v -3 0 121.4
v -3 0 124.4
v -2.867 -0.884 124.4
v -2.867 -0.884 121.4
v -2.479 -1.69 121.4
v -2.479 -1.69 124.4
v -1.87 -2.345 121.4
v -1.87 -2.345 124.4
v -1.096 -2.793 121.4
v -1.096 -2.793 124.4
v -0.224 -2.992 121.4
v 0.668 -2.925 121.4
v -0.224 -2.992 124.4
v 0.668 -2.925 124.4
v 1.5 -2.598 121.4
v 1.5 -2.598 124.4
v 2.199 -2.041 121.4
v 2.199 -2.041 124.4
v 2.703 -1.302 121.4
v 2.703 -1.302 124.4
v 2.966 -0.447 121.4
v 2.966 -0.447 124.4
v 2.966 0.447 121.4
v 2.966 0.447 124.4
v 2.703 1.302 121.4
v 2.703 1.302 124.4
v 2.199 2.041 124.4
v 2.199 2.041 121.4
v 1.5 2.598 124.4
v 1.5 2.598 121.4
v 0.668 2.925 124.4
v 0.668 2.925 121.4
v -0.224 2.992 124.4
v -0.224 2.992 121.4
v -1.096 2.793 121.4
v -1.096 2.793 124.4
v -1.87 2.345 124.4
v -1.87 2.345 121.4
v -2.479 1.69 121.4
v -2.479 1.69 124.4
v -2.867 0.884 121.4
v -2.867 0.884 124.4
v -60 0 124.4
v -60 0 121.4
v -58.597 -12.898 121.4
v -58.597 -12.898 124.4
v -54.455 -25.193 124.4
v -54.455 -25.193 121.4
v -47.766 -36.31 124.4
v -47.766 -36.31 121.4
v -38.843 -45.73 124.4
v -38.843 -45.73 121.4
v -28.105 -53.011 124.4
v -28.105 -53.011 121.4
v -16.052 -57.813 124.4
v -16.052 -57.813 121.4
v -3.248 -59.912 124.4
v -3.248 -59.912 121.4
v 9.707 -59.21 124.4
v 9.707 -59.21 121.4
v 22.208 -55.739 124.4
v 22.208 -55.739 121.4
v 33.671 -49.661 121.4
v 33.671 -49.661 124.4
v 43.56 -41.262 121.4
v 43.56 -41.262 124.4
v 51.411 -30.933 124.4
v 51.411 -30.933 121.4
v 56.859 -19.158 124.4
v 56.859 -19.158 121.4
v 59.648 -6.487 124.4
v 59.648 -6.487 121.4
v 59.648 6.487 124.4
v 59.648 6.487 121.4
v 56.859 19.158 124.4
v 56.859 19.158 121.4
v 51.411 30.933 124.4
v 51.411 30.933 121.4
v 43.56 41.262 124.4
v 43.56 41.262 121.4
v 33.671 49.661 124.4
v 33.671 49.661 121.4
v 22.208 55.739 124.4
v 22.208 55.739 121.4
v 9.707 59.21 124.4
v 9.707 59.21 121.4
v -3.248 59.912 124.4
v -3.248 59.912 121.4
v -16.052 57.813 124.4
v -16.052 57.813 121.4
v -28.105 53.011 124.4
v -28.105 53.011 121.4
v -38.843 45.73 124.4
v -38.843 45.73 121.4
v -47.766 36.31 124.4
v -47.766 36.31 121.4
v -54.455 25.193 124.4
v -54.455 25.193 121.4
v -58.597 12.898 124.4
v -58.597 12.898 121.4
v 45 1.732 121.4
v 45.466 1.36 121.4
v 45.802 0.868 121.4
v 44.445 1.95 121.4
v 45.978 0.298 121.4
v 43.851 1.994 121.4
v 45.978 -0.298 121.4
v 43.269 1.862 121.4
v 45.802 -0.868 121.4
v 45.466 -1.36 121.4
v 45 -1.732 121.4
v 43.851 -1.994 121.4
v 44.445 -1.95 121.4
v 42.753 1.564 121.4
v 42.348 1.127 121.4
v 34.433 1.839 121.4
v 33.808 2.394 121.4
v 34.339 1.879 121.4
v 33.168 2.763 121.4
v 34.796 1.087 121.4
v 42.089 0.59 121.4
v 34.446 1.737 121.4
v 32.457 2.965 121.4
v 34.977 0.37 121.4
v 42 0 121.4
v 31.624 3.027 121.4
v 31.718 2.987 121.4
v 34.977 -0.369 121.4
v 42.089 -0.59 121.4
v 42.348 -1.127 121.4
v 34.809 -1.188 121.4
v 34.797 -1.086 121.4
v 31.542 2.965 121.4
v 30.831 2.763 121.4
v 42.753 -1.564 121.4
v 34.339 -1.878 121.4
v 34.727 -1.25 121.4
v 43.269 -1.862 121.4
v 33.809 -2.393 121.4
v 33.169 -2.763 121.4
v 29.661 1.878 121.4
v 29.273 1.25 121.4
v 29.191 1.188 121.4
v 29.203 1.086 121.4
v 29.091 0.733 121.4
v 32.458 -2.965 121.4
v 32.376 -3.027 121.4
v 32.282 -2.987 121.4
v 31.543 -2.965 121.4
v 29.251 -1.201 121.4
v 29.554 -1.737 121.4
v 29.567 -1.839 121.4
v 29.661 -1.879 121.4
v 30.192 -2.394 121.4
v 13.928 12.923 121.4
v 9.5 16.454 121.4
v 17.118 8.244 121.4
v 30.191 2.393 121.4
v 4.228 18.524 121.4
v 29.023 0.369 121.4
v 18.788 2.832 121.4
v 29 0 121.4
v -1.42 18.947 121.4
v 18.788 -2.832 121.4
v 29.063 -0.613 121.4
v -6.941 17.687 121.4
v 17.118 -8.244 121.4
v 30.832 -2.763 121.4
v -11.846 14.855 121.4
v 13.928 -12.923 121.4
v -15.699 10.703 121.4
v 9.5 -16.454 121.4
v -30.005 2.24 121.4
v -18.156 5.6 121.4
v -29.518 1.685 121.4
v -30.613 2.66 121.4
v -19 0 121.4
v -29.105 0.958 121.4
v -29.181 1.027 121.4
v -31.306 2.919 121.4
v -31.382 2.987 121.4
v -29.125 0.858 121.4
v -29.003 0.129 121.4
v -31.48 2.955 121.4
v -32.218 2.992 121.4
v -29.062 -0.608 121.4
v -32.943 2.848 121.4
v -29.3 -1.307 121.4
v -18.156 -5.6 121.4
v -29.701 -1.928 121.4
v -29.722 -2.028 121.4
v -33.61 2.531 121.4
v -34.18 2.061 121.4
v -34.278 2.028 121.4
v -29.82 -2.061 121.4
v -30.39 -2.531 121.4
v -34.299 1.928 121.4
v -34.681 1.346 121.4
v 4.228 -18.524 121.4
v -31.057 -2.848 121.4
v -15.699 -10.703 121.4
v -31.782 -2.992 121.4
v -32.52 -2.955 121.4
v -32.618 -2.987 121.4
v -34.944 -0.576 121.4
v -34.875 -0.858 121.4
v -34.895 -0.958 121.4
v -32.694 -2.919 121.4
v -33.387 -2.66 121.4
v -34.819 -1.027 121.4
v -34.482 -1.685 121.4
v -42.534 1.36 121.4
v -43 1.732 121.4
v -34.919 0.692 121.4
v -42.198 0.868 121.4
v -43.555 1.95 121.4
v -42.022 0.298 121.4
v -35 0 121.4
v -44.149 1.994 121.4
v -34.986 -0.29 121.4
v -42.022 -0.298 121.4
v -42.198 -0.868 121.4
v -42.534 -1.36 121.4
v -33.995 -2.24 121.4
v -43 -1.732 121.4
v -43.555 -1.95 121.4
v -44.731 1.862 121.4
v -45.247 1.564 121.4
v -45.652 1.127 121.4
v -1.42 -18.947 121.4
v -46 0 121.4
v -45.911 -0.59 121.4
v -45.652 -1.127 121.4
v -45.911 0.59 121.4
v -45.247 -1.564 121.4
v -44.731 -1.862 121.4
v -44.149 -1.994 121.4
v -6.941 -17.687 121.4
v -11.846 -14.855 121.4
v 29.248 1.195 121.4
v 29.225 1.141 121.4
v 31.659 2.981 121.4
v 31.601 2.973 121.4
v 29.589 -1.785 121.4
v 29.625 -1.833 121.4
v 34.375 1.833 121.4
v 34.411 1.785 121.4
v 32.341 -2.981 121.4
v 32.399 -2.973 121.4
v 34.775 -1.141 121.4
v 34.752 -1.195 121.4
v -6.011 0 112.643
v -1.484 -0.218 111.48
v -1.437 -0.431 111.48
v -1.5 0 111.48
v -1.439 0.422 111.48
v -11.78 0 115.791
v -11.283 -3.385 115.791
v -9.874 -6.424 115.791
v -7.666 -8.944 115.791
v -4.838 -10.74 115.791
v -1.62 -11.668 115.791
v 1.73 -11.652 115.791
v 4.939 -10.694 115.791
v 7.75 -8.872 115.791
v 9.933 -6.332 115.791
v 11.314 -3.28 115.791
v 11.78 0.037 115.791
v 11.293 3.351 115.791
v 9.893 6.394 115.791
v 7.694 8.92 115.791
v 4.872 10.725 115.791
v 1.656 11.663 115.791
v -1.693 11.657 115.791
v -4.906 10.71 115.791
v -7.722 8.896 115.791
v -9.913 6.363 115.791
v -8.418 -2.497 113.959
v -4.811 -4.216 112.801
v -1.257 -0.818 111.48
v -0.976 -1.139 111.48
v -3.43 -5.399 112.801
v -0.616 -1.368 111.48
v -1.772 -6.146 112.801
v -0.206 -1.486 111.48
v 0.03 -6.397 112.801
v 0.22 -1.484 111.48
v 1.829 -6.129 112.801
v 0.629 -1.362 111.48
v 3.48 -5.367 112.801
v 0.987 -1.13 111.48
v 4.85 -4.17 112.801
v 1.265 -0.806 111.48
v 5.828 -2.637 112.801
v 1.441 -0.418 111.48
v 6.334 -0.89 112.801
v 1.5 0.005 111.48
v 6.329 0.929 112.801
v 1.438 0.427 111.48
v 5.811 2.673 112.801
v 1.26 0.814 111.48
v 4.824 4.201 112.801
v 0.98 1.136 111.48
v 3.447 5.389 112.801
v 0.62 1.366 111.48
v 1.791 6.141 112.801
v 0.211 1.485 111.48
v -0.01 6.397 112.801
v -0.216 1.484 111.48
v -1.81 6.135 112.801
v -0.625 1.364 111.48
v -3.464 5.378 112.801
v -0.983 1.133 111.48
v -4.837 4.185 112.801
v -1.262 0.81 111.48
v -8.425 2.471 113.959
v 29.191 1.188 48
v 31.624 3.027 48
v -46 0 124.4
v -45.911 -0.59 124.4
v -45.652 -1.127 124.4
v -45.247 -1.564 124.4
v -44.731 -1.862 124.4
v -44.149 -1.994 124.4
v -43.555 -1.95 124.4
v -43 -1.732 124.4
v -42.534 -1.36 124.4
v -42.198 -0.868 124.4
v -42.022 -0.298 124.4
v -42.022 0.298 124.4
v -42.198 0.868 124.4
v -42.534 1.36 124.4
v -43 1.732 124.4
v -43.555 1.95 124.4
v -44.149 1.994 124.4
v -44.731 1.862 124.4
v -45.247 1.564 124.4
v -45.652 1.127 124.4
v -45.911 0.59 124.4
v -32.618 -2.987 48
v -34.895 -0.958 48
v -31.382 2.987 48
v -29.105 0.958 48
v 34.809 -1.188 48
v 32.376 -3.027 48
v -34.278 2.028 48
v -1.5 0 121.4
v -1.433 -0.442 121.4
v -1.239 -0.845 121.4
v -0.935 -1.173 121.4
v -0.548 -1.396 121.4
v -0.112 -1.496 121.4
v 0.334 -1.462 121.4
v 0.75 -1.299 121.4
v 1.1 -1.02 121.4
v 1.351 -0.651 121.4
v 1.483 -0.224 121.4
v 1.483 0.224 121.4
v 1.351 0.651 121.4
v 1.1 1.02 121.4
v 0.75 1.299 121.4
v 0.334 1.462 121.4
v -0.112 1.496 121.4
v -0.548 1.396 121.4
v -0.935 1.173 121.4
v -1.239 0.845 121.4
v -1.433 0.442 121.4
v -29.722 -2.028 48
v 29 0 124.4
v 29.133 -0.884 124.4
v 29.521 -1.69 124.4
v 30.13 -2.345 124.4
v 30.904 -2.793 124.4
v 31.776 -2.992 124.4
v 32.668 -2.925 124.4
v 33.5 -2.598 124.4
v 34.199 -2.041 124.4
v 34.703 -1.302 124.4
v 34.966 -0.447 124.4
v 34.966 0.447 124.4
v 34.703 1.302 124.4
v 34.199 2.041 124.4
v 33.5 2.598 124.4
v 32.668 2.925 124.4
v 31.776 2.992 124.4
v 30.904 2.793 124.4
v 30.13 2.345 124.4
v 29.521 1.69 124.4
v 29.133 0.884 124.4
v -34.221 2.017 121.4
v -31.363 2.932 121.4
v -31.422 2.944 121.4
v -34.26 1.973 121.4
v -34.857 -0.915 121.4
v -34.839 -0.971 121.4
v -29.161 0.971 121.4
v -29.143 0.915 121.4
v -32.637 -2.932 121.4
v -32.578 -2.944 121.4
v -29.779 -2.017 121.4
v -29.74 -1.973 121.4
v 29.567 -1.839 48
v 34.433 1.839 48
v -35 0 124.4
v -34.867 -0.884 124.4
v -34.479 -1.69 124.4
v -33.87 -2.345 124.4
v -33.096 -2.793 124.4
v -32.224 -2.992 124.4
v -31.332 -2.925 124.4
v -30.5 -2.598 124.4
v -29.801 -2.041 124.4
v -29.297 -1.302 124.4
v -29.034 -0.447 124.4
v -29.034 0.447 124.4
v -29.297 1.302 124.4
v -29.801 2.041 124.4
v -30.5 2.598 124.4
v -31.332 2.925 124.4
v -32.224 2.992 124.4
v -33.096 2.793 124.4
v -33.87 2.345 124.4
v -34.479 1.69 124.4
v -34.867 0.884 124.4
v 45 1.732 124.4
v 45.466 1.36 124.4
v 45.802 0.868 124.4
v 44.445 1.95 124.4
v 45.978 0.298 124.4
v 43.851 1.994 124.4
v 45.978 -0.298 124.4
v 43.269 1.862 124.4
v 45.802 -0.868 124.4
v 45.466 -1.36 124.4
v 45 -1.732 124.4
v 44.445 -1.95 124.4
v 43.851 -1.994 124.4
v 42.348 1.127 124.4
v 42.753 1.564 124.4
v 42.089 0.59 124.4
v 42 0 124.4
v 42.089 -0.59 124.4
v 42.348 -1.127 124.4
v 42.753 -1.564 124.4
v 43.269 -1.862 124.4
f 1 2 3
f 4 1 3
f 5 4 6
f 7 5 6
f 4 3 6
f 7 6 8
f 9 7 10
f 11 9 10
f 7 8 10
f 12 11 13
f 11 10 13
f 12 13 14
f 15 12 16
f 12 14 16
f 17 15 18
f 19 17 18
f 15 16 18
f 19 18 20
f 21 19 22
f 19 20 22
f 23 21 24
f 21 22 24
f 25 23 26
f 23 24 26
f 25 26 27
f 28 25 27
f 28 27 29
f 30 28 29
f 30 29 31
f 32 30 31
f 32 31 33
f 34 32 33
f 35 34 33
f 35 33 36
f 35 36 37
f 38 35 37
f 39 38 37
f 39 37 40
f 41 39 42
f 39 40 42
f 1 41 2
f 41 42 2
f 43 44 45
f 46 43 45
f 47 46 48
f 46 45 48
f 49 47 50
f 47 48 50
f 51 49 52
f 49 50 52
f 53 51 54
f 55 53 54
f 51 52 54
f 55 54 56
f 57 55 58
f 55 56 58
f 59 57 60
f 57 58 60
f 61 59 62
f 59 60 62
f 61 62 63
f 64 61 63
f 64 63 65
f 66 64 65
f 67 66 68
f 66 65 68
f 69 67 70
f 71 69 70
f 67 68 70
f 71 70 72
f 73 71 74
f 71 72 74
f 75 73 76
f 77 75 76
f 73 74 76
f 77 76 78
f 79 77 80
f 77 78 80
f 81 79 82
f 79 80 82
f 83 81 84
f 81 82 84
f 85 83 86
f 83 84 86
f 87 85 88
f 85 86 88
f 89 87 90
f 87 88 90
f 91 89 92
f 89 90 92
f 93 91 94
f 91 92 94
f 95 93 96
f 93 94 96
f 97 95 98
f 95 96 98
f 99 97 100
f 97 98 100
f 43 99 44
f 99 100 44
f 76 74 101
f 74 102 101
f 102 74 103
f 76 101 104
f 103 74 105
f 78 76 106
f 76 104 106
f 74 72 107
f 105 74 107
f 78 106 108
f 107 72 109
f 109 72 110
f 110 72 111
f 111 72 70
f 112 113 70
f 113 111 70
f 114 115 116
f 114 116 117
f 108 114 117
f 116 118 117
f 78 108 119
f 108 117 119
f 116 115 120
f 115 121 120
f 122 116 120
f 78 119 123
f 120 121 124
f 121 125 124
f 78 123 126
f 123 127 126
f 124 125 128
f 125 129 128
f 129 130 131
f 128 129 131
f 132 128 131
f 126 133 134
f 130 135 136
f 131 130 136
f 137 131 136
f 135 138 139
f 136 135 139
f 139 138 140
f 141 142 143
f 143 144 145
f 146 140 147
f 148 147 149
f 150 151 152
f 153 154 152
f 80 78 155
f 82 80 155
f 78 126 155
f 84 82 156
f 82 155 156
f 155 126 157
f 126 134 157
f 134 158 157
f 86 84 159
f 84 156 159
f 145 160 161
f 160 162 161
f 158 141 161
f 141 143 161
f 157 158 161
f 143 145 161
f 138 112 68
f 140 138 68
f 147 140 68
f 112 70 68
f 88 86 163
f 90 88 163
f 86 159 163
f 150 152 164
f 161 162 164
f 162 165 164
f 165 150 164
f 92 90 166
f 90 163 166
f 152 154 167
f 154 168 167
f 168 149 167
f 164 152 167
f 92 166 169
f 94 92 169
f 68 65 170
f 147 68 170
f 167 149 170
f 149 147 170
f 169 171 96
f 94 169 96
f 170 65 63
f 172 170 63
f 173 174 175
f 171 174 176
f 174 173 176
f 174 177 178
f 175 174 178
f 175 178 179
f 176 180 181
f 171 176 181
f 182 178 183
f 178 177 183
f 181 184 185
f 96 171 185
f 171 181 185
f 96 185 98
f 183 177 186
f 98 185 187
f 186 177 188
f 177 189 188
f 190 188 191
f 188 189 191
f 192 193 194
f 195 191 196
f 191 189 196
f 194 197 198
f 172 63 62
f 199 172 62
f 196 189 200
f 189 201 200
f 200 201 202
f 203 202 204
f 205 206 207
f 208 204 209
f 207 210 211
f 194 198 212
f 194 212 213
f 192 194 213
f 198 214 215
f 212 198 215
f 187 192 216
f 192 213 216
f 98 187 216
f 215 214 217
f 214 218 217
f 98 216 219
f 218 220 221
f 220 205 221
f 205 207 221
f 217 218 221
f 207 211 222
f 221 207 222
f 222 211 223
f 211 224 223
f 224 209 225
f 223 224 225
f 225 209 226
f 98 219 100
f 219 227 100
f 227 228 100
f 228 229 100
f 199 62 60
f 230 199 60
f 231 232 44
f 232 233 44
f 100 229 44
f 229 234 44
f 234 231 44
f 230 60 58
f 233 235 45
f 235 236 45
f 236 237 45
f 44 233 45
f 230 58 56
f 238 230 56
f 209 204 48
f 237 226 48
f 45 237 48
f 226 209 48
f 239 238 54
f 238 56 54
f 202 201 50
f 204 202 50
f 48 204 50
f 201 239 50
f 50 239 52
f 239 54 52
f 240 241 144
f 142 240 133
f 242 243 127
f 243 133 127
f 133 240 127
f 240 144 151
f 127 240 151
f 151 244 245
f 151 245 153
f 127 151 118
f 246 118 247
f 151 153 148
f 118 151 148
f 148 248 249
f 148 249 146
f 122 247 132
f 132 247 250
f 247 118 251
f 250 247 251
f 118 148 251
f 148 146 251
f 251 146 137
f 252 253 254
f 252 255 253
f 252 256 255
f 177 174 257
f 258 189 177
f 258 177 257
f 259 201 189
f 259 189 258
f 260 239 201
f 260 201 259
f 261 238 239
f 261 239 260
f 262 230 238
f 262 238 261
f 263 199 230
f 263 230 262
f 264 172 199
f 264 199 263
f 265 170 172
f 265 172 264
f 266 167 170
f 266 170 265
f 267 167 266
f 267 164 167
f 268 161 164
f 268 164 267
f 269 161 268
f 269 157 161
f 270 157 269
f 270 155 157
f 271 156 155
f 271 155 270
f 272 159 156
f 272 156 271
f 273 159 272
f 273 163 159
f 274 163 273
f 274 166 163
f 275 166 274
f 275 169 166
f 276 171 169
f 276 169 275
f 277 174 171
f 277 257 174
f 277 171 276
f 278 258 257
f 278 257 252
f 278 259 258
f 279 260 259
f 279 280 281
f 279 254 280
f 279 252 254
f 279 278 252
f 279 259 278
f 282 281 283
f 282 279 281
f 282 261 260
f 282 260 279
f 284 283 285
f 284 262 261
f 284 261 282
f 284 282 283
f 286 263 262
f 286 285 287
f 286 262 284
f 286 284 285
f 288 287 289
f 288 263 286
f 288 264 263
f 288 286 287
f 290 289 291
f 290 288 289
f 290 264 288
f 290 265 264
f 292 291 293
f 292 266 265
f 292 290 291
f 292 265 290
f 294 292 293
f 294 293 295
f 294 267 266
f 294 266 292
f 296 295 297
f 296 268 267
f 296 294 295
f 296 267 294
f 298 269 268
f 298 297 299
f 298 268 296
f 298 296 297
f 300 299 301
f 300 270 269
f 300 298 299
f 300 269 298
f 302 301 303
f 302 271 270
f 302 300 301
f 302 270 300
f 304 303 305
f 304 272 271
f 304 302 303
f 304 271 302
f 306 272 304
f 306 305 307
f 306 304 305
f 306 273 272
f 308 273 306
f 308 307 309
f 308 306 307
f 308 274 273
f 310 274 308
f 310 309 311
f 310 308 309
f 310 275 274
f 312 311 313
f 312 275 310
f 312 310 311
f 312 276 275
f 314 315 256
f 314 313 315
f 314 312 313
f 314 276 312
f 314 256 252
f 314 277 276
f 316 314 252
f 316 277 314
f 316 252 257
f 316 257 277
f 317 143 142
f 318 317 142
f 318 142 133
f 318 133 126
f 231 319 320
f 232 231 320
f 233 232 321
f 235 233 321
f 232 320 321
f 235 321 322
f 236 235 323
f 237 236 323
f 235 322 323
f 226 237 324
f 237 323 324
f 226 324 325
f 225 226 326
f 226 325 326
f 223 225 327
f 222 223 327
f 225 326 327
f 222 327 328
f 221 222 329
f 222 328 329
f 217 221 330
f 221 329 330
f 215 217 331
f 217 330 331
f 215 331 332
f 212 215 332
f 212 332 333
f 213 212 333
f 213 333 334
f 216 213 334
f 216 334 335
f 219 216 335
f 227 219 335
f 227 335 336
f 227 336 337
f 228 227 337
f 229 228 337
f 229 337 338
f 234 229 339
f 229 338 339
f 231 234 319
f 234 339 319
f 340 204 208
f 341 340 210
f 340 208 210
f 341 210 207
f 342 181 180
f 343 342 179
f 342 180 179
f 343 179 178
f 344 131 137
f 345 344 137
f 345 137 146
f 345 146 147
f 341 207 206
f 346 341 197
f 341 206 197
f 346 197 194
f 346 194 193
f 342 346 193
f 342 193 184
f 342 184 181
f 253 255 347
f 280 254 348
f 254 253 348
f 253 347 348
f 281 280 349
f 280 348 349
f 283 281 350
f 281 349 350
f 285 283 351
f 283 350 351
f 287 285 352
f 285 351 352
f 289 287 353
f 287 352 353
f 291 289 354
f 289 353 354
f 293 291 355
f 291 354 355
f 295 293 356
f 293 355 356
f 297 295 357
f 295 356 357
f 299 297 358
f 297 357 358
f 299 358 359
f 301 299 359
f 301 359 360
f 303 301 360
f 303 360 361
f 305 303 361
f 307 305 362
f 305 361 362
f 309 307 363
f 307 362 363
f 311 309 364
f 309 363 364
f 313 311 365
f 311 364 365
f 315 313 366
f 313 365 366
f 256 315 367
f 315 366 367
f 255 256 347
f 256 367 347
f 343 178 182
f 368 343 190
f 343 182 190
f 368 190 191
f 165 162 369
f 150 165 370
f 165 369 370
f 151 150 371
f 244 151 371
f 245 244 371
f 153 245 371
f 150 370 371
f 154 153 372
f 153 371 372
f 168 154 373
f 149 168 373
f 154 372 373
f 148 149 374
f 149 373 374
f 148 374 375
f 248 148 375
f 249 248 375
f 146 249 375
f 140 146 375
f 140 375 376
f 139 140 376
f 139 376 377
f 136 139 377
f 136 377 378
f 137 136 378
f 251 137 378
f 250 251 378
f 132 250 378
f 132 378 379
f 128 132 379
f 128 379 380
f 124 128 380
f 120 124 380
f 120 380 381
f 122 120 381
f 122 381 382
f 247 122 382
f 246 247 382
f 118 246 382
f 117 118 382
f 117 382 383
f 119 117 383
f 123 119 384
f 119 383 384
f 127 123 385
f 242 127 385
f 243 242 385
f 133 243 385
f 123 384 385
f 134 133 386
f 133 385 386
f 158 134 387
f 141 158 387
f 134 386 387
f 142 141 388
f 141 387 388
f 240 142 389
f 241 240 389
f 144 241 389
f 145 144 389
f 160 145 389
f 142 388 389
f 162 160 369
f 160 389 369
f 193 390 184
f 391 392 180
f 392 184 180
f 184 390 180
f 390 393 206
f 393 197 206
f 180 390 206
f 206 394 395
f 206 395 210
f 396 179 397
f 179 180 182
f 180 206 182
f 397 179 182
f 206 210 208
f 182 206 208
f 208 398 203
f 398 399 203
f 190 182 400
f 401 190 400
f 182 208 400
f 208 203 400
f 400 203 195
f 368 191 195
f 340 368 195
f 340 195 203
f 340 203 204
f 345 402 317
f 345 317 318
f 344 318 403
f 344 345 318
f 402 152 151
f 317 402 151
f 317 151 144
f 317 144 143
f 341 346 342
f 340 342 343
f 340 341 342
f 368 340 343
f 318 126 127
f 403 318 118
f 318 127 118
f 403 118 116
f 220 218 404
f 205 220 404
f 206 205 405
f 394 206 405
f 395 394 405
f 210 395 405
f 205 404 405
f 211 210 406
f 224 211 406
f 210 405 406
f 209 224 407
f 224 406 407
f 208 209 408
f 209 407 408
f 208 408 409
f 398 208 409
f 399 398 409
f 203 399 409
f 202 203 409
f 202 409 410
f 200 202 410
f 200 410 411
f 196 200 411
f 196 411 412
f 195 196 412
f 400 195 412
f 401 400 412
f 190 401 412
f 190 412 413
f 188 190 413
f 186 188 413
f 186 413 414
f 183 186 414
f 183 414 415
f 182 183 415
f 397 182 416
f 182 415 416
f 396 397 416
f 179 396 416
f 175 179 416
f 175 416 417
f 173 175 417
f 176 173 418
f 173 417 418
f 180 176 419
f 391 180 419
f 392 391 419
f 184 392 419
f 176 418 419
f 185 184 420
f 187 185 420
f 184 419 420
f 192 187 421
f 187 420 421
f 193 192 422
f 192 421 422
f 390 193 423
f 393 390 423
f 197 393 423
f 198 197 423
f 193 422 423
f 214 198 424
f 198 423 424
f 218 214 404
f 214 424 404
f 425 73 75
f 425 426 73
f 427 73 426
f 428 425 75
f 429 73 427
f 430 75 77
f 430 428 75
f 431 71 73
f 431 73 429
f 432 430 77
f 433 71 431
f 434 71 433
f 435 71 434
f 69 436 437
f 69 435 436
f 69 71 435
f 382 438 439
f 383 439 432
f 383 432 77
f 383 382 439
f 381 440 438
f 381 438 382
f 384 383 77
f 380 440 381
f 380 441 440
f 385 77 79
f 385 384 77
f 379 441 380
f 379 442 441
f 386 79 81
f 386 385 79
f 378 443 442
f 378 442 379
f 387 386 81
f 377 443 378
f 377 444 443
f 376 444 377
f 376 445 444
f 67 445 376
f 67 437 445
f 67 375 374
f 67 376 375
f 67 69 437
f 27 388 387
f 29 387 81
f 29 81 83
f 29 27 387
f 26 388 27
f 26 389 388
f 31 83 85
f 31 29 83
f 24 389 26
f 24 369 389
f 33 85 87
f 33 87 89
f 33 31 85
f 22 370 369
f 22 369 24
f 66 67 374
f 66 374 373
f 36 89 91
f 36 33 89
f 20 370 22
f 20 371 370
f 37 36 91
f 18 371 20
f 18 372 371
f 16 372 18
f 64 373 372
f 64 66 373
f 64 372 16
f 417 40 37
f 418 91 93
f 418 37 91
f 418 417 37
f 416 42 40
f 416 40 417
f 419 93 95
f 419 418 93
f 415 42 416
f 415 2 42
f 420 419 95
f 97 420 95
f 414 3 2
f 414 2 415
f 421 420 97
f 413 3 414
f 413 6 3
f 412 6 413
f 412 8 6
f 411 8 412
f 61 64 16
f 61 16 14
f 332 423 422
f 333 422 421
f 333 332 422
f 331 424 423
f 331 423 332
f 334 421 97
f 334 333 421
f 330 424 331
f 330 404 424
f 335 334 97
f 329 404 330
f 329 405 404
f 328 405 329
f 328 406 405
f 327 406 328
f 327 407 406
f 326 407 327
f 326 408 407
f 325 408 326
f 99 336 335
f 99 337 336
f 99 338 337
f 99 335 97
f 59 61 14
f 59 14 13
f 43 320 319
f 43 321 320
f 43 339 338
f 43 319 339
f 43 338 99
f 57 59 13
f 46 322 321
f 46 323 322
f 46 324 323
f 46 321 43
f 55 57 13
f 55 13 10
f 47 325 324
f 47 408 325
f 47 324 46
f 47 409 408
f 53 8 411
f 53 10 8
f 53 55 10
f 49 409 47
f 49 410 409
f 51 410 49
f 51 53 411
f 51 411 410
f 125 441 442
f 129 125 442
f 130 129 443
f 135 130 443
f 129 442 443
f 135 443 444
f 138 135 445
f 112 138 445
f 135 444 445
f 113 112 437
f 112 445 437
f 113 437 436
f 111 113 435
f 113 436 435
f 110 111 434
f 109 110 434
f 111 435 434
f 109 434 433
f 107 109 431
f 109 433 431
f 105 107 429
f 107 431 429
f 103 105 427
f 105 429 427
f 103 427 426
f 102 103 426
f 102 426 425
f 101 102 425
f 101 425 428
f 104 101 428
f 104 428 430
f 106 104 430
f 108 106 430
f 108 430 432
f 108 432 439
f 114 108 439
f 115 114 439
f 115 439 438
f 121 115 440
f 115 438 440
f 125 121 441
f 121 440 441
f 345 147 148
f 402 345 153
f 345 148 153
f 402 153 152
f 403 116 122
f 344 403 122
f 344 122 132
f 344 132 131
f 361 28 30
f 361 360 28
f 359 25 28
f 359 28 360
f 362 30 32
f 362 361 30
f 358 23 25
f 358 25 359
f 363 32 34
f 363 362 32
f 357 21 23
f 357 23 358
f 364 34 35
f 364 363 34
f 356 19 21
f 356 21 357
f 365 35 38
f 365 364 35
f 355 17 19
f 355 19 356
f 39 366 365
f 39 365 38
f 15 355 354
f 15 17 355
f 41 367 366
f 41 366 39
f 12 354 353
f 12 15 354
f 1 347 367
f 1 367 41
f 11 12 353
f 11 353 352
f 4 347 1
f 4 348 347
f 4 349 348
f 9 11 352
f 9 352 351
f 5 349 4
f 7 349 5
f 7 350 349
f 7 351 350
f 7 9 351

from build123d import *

# Parameters (mm, degrees)
SKETCH265_R     = 60
PAD106_DEPTH    = 3
SKETCH266_R     = 3
SKETCH266_R_2   = 2
POCKET129_DEPTH = 3
SKETCH267_R     = 1.5
POCKET130_DEPTH = 13.001
PAD111_DEPTH    = 73.4


with BuildPart() as part:
    # Sketch005 → Revolution (revolve)
    with BuildSketch(Plane.XZ):
        with BuildLine():
            add(Edge.make_bspline(
                [(0, 112), (-7.388889, 112), (-19, 122)],
                knots=[0, 0, 0, 1.023749, 1.023749, 1.023749], degree=2, weights=[1, 1.133893, 1]))
            Line((-19, 122), (0, 122))
            Line((0, 122), (0, 112))
        make_face()
    revolve(axis=Axis((0, 0, 0), (0, 0, 1)))

    # Sketch265 (on Face2 of Revolution) → Pad106 (new body)
    with BuildSketch(Plane(origin=(0, 0, 122), x_dir=(-1, 0, 0), z_dir=(0, 0, 1))):
        Circle(SKETCH265_R)
    extrude(amount=PAD106_DEPTH)

    # Sketch266 (on Face3 of Pad106) → Pocket129 (cut)
    with BuildSketch(Plane(origin=(0, 0, 125), x_dir=(-1, 0, 0), z_dir=(0, 0, 1))):
        Circle(SKETCH266_R)
        with Locations((-32, 0)):
            Circle(SKETCH266_R)
        with Locations((32, 0)):
            Circle(SKETCH266_R)
        with Locations((-44, 0)):
            Circle(SKETCH266_R_2)
        with Locations((44, 0)):
            Circle(SKETCH266_R_2)
    extrude(amount=-POCKET129_DEPTH, mode=Mode.SUBTRACT)

    # Sketch267 (on Face3 of Pocket129) → Pocket130 (cut, through all)
    with BuildSketch(Plane(origin=(0, 0, 125), x_dir=(-1, 0, 0), z_dir=(0, 0, 1))):
        Circle(SKETCH267_R)
    extrude(amount=-POCKET130_DEPTH, mode=Mode.SUBTRACT)

    # Sketch274 (on Face2 of Pocket130) → Pad111 (join)
    with BuildSketch(Plane(origin=(0, 0, 122), x_dir=(1, 0, 0), z_dir=(0, 0, -1))):
        Polygon((-29.10452, -0.958487), (-29.722186, 2.028316), (-32.617666, 2.986802), (-34.89548, 0.958487), (-34.277814, -2.028316), (-31.382334, -2.986802), align=None)
        Polygon((34.433148, -1.839101), (34.809282, 1.187617), (32.376134, 3.026718), (29.566852, 1.839101), (29.190718, -1.187617), (31.623866, -3.026718), align=None)
    extrude(amount=PAD111_DEPTH)


with BuildPart() as part_1:
    # Body001 placement: moved
    add(part.part.moved(Location((0, 0, -0.6))))


solid = part_1.part
